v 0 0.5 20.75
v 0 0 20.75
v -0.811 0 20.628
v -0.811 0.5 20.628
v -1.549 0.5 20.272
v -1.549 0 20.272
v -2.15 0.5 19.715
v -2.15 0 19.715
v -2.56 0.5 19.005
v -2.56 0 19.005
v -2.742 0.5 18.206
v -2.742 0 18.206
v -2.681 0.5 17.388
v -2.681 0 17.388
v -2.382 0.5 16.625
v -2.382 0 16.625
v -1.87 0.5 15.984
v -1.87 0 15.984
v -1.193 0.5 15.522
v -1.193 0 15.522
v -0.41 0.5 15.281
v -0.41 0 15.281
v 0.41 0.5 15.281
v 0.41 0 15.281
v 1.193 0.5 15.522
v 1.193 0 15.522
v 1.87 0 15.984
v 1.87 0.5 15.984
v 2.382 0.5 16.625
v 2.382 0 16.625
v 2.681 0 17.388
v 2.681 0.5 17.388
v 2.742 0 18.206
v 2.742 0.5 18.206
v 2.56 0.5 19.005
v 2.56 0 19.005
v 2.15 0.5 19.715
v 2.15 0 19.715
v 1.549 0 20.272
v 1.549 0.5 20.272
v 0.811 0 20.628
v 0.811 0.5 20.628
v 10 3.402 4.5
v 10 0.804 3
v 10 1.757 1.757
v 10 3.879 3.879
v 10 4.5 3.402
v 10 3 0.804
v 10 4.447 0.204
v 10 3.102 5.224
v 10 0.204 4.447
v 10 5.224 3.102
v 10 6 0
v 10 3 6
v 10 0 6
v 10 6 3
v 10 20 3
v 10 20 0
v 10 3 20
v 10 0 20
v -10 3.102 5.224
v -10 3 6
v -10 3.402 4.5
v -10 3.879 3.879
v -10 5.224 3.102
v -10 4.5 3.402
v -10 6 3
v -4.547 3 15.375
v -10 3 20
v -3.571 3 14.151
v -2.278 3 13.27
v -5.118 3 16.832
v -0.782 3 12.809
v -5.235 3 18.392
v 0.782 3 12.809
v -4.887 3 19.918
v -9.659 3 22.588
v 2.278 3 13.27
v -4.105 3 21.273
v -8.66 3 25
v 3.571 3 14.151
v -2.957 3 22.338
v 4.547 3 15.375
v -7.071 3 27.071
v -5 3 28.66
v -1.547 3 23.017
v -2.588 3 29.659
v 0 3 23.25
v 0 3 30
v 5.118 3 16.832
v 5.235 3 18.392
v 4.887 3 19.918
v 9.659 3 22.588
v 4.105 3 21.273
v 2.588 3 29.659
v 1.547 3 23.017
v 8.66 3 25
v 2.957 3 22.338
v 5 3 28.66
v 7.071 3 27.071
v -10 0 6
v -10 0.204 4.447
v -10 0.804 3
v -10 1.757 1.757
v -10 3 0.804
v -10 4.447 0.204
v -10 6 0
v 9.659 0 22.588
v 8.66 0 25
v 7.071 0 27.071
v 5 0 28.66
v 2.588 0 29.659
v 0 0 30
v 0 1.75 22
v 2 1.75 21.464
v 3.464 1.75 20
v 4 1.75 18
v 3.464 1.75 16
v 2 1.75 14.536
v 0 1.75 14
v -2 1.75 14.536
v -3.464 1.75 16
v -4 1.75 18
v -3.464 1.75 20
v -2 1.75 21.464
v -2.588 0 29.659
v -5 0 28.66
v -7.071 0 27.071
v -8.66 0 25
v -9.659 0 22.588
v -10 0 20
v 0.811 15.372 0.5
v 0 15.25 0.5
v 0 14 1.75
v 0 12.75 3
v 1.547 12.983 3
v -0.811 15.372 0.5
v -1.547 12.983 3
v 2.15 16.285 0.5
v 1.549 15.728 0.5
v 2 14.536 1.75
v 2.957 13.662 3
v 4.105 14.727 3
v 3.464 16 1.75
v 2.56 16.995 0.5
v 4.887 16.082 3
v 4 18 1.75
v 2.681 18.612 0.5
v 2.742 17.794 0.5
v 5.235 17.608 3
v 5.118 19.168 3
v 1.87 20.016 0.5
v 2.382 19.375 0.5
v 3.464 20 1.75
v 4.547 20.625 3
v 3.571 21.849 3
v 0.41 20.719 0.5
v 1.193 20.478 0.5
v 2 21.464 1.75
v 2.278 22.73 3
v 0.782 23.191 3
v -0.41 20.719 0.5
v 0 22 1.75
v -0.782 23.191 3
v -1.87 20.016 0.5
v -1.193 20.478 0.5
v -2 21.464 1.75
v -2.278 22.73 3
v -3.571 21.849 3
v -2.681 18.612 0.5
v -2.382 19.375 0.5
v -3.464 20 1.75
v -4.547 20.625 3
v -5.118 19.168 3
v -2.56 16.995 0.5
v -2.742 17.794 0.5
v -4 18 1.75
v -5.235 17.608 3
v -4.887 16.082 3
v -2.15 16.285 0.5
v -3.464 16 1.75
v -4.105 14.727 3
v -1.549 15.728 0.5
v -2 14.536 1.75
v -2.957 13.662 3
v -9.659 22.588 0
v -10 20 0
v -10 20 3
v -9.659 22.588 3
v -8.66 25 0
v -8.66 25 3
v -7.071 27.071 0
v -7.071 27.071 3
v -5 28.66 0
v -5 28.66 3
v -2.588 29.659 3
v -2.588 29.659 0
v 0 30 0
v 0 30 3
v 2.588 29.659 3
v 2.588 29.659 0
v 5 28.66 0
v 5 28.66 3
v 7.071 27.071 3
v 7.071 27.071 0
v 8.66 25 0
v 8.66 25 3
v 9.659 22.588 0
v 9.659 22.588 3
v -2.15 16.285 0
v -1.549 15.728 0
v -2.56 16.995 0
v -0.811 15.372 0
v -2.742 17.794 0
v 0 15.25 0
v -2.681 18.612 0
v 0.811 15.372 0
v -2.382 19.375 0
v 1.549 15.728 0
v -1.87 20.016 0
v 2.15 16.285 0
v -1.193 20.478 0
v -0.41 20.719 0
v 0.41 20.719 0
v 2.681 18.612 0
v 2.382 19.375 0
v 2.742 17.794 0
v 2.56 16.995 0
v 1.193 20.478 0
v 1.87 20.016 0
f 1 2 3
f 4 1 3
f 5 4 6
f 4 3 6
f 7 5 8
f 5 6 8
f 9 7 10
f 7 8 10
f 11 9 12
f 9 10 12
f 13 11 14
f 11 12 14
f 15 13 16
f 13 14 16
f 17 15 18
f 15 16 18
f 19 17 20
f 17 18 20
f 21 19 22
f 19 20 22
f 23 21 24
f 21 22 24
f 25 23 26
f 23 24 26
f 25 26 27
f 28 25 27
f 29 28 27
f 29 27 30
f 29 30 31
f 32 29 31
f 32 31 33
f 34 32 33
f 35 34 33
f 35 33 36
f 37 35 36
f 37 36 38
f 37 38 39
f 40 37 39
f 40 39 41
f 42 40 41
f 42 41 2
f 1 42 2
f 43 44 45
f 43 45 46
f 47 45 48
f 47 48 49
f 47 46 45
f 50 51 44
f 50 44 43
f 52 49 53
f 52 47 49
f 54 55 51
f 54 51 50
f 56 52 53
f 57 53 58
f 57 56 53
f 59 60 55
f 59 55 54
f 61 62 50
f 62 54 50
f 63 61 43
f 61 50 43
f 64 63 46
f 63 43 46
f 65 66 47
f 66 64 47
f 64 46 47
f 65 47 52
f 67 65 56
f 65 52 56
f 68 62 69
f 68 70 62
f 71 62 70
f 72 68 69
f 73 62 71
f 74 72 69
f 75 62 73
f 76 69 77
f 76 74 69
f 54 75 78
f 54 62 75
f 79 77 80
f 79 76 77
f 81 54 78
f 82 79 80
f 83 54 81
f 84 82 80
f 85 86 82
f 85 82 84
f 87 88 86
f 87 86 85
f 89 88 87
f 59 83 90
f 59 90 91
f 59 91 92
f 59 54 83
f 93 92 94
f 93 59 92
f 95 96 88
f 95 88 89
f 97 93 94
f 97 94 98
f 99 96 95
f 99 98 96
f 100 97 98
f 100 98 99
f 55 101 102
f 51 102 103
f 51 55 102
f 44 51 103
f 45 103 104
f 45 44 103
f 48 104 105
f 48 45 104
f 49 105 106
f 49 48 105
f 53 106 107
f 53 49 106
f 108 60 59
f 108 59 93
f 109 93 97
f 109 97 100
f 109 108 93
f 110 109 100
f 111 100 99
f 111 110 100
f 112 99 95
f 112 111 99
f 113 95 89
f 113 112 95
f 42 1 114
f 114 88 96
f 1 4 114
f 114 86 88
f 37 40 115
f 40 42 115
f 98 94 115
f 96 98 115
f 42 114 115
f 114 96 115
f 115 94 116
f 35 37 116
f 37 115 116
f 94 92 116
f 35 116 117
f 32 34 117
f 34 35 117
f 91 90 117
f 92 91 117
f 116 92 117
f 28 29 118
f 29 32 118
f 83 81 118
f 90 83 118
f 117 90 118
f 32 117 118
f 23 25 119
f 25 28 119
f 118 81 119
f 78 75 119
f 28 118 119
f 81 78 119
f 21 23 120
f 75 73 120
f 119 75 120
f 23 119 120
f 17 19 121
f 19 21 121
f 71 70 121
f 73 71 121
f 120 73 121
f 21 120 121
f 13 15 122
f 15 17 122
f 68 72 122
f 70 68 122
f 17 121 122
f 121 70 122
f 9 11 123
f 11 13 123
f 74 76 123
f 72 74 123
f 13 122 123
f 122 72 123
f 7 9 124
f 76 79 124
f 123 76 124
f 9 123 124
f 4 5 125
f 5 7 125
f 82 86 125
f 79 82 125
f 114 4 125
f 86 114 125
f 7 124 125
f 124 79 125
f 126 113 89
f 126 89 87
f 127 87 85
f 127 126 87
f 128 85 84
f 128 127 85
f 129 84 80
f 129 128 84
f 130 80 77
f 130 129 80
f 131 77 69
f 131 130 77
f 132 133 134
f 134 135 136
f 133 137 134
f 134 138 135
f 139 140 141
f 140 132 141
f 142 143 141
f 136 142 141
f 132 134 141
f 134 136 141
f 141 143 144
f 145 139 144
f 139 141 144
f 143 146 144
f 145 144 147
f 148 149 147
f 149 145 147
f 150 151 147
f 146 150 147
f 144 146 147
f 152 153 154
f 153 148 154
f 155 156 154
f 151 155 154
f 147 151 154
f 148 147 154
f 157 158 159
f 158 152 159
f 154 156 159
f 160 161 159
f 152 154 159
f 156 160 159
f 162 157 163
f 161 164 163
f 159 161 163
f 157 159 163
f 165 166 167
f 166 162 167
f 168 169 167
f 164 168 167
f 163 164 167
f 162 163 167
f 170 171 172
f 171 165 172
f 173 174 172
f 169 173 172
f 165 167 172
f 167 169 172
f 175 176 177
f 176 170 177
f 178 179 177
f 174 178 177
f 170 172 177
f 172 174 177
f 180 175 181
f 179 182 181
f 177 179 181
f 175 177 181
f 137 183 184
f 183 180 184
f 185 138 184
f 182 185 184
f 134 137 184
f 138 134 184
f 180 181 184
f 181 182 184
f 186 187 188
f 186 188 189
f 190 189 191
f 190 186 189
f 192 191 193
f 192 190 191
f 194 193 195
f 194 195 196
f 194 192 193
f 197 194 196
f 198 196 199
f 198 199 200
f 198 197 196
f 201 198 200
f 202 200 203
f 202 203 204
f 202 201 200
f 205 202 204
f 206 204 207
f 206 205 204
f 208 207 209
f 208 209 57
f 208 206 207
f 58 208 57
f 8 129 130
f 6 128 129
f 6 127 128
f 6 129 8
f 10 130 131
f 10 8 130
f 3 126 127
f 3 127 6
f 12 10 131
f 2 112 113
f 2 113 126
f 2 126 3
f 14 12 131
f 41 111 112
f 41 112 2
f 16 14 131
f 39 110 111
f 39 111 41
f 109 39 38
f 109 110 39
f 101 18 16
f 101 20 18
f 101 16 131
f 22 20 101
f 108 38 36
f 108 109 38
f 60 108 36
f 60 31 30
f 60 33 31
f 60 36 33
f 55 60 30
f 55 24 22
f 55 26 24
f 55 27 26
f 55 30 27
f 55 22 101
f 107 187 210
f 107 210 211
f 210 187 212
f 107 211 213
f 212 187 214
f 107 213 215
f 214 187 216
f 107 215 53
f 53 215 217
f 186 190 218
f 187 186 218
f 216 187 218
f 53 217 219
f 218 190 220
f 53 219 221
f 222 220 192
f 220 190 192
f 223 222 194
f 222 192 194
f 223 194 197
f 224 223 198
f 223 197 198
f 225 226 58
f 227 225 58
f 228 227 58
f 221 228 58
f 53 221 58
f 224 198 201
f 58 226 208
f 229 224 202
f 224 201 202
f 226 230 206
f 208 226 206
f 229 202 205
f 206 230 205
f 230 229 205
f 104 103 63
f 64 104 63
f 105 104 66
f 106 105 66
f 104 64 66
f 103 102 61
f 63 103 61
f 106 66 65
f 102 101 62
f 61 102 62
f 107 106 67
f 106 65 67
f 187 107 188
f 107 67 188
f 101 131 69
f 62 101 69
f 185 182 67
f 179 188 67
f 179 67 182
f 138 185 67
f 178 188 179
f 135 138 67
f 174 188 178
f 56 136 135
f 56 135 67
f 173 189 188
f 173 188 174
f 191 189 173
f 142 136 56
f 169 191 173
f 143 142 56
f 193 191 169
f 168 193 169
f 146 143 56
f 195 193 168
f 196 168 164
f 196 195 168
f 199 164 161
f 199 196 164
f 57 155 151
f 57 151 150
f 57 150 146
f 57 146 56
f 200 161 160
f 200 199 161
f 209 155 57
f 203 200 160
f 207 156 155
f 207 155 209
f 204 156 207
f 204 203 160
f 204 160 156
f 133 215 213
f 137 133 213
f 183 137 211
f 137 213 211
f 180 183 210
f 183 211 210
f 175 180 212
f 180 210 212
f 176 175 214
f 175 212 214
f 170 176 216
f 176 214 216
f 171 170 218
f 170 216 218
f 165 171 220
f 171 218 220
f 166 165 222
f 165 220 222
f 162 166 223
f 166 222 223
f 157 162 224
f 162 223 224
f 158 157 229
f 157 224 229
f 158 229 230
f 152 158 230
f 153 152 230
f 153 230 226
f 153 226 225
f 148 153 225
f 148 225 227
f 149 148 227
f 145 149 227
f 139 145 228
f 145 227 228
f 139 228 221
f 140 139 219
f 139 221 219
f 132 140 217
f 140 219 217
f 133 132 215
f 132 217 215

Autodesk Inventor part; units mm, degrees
ref_plane "YZ Plane" through (0, 0, 0) normal (1, 0, 0) x (0, 1, 0)
ref_plane "XZ Plane" through (0, 0, 0) normal (0, 1, 0) x (-1, 0, 0)
ref_plane "XY Plane" through (0, 0, 0) normal (0, 0, 1) x (1, 0, 0)
sketch "Эскиз1" plane through (0, 0, 0) normal (0, 0, 1) x (1, 0, 0)
  line L0 (-10, 0) -> (10, 0)
  line L1 (10, 0) -> (10, 20)
  line L2 (0, 30) -> (0, 30)
  line L3 (-10, 20) -> (-10, 0)
  arc A0 (0, 30) -> (-10, 20) centre (0, 20) ccw
  arc A1 (10, 20) -> (0, 30) centre (0, 20) ccw
  line L4 (0, -6.4142) -> (0, 38.4853)
  point P0 (0, 0)
  point P1 (0, 30)
  dimension "d0" = 20
  dimension "d1" = 10
  dimension "d2" = 20
extrude "Пластина1" add sketch "Эскиз1" along normal blind 3
sketch "Эскиз2" plane through (10, 3, 0) normal (0, -1, 0) x (1, 0, 0)
  line L0 (-20, 0) -> (0, 0)
  line L1 (0, 0) -> (0, 30)
  line L2 (0, 30) -> (-20, 30)
  line L3 (-20, 30) -> (-20, 0)
edge flange "Фланец1" height 30 angle 90 thickness 3 bend radius 3 thickness toward (0, -1, 0) relief tear relief width 3 relief depth 1.5 edges at (0, 0, 3) wall of the first edge with corners at (-10, 3, 0) (10, 3, 0) (10, 3, 30) (-10, 3, 30)
bend "Сгиб1"
corner "УглСтык1"
fillet "Сопряжение1" radius 10 2 edges at (-10, 1.5, 30) (10, 1.5, 30)
sketch "Эскиз3" plane through (0, 0, 3) normal (0, 0, 1) x (1, 0, 0)
  line L0 (0, -6) -> (0, 36) projected
  arc A0 (10, 20) -> (-10, 20) centre (0, 20) ccw projected
  point P0 (0, 0)
  point P1 (0, 18)
  point P2 (0, 30)
  dimension "d29" = 12
hole "Отверстие1" at (0, 18, 3) direction (0, 0, -1) diameter 5.5 end through all countersink diameter 10.5 countersink angle 90
sketch "Эскиз4" plane through (-10, 3, 6) normal (0, 1, 0) x (1, 0, 0)
  line L0 (0, 0) -> (0, -14) projected
  arc A0 (0, -14) -> (20, -14) centre (10, -14) ccw projected
  point P0 (10, 6)
  point P1 (10, -12)
  point P2 (10, -24)
  dimension "d30" = 10
  dimension "d31" = 12
hole "Отверстие2" at (0, 3, 18) direction (0, -1, 0) diameter 5.5 end through all countersink diameter 10.5 countersink angle 90
equation "\"d20\" = Толщина"
equation "\"d3\" = Толщина"
equation "\"d4\" = Ширина_просечки"
equation "\"d5\" = Глубина_просечки"
equation "\"d6\" = Мин_остаток"
equation "\"d7\" = Радиус_перехода"
equation "\"d10\" = Радиус_гибки"
equation "\"d11\" = Размер_просечки"
equation "\"d12\" = Размер_зазора"
equation "\"d13\" = Радиус_Якоби"
equation "\"Радиус_гибки\" = Толщина"
equation "\"Ширина_просечки\" = Толщина"
equation "\"Глубина_просечки\" = 0.5 * Толщина"
equation "\"Размер_просечки\" = 4 * Толщина"
equation "\"Мин_остаток\" = 2 * Толщина"
equation "\"Радиус_перехода\" = Радиус_гибки"
equation "\"Радиус_Якоби\" = Радиус_гибки"
equation "\"Размер_зазора\" = Толщина"
equation "\"Толщина\" = 3"
properties part number "скоба"
